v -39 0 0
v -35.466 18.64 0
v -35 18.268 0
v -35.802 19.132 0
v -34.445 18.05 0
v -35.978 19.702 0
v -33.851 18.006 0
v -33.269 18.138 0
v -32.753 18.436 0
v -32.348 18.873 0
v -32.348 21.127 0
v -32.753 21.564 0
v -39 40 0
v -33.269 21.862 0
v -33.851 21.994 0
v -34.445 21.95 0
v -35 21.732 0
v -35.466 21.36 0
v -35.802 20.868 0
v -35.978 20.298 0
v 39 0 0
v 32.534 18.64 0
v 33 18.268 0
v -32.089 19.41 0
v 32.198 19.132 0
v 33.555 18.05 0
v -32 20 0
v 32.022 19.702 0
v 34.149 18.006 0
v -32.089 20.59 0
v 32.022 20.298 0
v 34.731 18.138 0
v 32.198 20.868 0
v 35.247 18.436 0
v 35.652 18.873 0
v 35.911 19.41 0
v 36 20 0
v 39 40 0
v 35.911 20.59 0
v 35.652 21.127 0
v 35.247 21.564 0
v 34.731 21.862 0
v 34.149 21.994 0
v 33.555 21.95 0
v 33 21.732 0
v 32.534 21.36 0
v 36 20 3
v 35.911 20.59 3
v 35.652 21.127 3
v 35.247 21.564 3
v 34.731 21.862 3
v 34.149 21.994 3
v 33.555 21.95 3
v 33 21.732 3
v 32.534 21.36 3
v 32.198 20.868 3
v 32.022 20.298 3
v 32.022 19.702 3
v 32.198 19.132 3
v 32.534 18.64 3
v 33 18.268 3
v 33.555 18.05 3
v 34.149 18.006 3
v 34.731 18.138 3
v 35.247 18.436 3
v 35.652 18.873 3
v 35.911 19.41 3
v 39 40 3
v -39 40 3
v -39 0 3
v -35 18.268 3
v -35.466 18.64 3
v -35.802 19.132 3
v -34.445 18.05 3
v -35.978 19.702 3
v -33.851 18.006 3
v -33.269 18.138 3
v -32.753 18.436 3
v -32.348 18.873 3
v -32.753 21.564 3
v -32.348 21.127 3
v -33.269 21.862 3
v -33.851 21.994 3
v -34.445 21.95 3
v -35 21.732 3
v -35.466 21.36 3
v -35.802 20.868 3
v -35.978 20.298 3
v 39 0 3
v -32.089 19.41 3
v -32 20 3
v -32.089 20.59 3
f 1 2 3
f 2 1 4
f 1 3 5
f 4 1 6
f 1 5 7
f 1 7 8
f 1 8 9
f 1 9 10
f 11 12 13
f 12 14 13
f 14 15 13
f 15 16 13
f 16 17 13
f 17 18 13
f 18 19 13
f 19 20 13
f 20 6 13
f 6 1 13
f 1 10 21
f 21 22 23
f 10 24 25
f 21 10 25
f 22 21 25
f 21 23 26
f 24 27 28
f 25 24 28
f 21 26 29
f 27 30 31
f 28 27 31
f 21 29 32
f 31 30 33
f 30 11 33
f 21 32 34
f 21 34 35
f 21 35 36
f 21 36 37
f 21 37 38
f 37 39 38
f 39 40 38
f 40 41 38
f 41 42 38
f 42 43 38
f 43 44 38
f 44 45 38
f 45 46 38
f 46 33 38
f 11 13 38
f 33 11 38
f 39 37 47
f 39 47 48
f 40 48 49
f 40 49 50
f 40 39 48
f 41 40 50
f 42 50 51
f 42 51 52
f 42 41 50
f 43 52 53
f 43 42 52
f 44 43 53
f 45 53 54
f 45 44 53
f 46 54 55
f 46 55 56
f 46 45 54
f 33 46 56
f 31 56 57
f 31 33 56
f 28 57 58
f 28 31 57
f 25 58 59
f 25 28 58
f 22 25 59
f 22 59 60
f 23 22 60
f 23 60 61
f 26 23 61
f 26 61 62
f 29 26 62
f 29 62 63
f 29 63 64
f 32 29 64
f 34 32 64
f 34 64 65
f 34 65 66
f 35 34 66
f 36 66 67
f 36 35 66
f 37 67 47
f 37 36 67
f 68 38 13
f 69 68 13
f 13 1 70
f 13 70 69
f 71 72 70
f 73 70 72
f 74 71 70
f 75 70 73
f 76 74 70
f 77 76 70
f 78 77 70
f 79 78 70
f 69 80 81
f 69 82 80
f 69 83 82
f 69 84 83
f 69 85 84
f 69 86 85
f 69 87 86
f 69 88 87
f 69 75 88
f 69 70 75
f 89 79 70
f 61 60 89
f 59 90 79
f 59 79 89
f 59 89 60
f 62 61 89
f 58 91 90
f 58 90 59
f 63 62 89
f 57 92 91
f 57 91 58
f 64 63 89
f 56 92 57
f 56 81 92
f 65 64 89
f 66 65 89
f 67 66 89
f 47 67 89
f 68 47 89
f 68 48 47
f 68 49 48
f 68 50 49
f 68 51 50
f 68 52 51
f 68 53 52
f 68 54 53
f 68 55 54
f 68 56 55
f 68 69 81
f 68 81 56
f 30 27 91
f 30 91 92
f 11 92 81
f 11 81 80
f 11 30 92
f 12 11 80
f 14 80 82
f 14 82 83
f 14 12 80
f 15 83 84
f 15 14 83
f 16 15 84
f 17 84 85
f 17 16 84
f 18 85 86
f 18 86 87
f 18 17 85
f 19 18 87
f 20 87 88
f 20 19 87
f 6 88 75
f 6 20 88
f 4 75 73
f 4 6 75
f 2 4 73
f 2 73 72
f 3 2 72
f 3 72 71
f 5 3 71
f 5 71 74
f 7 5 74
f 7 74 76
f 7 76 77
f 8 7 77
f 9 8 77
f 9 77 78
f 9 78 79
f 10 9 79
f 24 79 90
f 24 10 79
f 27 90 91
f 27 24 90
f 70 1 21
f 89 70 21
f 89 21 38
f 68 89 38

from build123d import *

# Parameters (mm, degrees)
F0_W     = 39
F0_H     = 40
F0_R     = 2
F1_DEPTH = 3


with BuildPart() as f1:
    # F0 (on Top) → F1 (new body)
    with BuildSketch(Plane.XY):
        with Locations((-19.5, 20)):
            Rectangle(F0_W, F0_H)
        with Locations((-34, 20)):
            Circle(F0_R, mode=Mode.SUBTRACT)
        with Locations((19.5, 20)):
            Rectangle(F0_W, F0_H)
        with Locations((34, 20)):
            Circle(F0_R, mode=Mode.SUBTRACT)
    extrude(amount=F1_DEPTH)


solid = f1.part
